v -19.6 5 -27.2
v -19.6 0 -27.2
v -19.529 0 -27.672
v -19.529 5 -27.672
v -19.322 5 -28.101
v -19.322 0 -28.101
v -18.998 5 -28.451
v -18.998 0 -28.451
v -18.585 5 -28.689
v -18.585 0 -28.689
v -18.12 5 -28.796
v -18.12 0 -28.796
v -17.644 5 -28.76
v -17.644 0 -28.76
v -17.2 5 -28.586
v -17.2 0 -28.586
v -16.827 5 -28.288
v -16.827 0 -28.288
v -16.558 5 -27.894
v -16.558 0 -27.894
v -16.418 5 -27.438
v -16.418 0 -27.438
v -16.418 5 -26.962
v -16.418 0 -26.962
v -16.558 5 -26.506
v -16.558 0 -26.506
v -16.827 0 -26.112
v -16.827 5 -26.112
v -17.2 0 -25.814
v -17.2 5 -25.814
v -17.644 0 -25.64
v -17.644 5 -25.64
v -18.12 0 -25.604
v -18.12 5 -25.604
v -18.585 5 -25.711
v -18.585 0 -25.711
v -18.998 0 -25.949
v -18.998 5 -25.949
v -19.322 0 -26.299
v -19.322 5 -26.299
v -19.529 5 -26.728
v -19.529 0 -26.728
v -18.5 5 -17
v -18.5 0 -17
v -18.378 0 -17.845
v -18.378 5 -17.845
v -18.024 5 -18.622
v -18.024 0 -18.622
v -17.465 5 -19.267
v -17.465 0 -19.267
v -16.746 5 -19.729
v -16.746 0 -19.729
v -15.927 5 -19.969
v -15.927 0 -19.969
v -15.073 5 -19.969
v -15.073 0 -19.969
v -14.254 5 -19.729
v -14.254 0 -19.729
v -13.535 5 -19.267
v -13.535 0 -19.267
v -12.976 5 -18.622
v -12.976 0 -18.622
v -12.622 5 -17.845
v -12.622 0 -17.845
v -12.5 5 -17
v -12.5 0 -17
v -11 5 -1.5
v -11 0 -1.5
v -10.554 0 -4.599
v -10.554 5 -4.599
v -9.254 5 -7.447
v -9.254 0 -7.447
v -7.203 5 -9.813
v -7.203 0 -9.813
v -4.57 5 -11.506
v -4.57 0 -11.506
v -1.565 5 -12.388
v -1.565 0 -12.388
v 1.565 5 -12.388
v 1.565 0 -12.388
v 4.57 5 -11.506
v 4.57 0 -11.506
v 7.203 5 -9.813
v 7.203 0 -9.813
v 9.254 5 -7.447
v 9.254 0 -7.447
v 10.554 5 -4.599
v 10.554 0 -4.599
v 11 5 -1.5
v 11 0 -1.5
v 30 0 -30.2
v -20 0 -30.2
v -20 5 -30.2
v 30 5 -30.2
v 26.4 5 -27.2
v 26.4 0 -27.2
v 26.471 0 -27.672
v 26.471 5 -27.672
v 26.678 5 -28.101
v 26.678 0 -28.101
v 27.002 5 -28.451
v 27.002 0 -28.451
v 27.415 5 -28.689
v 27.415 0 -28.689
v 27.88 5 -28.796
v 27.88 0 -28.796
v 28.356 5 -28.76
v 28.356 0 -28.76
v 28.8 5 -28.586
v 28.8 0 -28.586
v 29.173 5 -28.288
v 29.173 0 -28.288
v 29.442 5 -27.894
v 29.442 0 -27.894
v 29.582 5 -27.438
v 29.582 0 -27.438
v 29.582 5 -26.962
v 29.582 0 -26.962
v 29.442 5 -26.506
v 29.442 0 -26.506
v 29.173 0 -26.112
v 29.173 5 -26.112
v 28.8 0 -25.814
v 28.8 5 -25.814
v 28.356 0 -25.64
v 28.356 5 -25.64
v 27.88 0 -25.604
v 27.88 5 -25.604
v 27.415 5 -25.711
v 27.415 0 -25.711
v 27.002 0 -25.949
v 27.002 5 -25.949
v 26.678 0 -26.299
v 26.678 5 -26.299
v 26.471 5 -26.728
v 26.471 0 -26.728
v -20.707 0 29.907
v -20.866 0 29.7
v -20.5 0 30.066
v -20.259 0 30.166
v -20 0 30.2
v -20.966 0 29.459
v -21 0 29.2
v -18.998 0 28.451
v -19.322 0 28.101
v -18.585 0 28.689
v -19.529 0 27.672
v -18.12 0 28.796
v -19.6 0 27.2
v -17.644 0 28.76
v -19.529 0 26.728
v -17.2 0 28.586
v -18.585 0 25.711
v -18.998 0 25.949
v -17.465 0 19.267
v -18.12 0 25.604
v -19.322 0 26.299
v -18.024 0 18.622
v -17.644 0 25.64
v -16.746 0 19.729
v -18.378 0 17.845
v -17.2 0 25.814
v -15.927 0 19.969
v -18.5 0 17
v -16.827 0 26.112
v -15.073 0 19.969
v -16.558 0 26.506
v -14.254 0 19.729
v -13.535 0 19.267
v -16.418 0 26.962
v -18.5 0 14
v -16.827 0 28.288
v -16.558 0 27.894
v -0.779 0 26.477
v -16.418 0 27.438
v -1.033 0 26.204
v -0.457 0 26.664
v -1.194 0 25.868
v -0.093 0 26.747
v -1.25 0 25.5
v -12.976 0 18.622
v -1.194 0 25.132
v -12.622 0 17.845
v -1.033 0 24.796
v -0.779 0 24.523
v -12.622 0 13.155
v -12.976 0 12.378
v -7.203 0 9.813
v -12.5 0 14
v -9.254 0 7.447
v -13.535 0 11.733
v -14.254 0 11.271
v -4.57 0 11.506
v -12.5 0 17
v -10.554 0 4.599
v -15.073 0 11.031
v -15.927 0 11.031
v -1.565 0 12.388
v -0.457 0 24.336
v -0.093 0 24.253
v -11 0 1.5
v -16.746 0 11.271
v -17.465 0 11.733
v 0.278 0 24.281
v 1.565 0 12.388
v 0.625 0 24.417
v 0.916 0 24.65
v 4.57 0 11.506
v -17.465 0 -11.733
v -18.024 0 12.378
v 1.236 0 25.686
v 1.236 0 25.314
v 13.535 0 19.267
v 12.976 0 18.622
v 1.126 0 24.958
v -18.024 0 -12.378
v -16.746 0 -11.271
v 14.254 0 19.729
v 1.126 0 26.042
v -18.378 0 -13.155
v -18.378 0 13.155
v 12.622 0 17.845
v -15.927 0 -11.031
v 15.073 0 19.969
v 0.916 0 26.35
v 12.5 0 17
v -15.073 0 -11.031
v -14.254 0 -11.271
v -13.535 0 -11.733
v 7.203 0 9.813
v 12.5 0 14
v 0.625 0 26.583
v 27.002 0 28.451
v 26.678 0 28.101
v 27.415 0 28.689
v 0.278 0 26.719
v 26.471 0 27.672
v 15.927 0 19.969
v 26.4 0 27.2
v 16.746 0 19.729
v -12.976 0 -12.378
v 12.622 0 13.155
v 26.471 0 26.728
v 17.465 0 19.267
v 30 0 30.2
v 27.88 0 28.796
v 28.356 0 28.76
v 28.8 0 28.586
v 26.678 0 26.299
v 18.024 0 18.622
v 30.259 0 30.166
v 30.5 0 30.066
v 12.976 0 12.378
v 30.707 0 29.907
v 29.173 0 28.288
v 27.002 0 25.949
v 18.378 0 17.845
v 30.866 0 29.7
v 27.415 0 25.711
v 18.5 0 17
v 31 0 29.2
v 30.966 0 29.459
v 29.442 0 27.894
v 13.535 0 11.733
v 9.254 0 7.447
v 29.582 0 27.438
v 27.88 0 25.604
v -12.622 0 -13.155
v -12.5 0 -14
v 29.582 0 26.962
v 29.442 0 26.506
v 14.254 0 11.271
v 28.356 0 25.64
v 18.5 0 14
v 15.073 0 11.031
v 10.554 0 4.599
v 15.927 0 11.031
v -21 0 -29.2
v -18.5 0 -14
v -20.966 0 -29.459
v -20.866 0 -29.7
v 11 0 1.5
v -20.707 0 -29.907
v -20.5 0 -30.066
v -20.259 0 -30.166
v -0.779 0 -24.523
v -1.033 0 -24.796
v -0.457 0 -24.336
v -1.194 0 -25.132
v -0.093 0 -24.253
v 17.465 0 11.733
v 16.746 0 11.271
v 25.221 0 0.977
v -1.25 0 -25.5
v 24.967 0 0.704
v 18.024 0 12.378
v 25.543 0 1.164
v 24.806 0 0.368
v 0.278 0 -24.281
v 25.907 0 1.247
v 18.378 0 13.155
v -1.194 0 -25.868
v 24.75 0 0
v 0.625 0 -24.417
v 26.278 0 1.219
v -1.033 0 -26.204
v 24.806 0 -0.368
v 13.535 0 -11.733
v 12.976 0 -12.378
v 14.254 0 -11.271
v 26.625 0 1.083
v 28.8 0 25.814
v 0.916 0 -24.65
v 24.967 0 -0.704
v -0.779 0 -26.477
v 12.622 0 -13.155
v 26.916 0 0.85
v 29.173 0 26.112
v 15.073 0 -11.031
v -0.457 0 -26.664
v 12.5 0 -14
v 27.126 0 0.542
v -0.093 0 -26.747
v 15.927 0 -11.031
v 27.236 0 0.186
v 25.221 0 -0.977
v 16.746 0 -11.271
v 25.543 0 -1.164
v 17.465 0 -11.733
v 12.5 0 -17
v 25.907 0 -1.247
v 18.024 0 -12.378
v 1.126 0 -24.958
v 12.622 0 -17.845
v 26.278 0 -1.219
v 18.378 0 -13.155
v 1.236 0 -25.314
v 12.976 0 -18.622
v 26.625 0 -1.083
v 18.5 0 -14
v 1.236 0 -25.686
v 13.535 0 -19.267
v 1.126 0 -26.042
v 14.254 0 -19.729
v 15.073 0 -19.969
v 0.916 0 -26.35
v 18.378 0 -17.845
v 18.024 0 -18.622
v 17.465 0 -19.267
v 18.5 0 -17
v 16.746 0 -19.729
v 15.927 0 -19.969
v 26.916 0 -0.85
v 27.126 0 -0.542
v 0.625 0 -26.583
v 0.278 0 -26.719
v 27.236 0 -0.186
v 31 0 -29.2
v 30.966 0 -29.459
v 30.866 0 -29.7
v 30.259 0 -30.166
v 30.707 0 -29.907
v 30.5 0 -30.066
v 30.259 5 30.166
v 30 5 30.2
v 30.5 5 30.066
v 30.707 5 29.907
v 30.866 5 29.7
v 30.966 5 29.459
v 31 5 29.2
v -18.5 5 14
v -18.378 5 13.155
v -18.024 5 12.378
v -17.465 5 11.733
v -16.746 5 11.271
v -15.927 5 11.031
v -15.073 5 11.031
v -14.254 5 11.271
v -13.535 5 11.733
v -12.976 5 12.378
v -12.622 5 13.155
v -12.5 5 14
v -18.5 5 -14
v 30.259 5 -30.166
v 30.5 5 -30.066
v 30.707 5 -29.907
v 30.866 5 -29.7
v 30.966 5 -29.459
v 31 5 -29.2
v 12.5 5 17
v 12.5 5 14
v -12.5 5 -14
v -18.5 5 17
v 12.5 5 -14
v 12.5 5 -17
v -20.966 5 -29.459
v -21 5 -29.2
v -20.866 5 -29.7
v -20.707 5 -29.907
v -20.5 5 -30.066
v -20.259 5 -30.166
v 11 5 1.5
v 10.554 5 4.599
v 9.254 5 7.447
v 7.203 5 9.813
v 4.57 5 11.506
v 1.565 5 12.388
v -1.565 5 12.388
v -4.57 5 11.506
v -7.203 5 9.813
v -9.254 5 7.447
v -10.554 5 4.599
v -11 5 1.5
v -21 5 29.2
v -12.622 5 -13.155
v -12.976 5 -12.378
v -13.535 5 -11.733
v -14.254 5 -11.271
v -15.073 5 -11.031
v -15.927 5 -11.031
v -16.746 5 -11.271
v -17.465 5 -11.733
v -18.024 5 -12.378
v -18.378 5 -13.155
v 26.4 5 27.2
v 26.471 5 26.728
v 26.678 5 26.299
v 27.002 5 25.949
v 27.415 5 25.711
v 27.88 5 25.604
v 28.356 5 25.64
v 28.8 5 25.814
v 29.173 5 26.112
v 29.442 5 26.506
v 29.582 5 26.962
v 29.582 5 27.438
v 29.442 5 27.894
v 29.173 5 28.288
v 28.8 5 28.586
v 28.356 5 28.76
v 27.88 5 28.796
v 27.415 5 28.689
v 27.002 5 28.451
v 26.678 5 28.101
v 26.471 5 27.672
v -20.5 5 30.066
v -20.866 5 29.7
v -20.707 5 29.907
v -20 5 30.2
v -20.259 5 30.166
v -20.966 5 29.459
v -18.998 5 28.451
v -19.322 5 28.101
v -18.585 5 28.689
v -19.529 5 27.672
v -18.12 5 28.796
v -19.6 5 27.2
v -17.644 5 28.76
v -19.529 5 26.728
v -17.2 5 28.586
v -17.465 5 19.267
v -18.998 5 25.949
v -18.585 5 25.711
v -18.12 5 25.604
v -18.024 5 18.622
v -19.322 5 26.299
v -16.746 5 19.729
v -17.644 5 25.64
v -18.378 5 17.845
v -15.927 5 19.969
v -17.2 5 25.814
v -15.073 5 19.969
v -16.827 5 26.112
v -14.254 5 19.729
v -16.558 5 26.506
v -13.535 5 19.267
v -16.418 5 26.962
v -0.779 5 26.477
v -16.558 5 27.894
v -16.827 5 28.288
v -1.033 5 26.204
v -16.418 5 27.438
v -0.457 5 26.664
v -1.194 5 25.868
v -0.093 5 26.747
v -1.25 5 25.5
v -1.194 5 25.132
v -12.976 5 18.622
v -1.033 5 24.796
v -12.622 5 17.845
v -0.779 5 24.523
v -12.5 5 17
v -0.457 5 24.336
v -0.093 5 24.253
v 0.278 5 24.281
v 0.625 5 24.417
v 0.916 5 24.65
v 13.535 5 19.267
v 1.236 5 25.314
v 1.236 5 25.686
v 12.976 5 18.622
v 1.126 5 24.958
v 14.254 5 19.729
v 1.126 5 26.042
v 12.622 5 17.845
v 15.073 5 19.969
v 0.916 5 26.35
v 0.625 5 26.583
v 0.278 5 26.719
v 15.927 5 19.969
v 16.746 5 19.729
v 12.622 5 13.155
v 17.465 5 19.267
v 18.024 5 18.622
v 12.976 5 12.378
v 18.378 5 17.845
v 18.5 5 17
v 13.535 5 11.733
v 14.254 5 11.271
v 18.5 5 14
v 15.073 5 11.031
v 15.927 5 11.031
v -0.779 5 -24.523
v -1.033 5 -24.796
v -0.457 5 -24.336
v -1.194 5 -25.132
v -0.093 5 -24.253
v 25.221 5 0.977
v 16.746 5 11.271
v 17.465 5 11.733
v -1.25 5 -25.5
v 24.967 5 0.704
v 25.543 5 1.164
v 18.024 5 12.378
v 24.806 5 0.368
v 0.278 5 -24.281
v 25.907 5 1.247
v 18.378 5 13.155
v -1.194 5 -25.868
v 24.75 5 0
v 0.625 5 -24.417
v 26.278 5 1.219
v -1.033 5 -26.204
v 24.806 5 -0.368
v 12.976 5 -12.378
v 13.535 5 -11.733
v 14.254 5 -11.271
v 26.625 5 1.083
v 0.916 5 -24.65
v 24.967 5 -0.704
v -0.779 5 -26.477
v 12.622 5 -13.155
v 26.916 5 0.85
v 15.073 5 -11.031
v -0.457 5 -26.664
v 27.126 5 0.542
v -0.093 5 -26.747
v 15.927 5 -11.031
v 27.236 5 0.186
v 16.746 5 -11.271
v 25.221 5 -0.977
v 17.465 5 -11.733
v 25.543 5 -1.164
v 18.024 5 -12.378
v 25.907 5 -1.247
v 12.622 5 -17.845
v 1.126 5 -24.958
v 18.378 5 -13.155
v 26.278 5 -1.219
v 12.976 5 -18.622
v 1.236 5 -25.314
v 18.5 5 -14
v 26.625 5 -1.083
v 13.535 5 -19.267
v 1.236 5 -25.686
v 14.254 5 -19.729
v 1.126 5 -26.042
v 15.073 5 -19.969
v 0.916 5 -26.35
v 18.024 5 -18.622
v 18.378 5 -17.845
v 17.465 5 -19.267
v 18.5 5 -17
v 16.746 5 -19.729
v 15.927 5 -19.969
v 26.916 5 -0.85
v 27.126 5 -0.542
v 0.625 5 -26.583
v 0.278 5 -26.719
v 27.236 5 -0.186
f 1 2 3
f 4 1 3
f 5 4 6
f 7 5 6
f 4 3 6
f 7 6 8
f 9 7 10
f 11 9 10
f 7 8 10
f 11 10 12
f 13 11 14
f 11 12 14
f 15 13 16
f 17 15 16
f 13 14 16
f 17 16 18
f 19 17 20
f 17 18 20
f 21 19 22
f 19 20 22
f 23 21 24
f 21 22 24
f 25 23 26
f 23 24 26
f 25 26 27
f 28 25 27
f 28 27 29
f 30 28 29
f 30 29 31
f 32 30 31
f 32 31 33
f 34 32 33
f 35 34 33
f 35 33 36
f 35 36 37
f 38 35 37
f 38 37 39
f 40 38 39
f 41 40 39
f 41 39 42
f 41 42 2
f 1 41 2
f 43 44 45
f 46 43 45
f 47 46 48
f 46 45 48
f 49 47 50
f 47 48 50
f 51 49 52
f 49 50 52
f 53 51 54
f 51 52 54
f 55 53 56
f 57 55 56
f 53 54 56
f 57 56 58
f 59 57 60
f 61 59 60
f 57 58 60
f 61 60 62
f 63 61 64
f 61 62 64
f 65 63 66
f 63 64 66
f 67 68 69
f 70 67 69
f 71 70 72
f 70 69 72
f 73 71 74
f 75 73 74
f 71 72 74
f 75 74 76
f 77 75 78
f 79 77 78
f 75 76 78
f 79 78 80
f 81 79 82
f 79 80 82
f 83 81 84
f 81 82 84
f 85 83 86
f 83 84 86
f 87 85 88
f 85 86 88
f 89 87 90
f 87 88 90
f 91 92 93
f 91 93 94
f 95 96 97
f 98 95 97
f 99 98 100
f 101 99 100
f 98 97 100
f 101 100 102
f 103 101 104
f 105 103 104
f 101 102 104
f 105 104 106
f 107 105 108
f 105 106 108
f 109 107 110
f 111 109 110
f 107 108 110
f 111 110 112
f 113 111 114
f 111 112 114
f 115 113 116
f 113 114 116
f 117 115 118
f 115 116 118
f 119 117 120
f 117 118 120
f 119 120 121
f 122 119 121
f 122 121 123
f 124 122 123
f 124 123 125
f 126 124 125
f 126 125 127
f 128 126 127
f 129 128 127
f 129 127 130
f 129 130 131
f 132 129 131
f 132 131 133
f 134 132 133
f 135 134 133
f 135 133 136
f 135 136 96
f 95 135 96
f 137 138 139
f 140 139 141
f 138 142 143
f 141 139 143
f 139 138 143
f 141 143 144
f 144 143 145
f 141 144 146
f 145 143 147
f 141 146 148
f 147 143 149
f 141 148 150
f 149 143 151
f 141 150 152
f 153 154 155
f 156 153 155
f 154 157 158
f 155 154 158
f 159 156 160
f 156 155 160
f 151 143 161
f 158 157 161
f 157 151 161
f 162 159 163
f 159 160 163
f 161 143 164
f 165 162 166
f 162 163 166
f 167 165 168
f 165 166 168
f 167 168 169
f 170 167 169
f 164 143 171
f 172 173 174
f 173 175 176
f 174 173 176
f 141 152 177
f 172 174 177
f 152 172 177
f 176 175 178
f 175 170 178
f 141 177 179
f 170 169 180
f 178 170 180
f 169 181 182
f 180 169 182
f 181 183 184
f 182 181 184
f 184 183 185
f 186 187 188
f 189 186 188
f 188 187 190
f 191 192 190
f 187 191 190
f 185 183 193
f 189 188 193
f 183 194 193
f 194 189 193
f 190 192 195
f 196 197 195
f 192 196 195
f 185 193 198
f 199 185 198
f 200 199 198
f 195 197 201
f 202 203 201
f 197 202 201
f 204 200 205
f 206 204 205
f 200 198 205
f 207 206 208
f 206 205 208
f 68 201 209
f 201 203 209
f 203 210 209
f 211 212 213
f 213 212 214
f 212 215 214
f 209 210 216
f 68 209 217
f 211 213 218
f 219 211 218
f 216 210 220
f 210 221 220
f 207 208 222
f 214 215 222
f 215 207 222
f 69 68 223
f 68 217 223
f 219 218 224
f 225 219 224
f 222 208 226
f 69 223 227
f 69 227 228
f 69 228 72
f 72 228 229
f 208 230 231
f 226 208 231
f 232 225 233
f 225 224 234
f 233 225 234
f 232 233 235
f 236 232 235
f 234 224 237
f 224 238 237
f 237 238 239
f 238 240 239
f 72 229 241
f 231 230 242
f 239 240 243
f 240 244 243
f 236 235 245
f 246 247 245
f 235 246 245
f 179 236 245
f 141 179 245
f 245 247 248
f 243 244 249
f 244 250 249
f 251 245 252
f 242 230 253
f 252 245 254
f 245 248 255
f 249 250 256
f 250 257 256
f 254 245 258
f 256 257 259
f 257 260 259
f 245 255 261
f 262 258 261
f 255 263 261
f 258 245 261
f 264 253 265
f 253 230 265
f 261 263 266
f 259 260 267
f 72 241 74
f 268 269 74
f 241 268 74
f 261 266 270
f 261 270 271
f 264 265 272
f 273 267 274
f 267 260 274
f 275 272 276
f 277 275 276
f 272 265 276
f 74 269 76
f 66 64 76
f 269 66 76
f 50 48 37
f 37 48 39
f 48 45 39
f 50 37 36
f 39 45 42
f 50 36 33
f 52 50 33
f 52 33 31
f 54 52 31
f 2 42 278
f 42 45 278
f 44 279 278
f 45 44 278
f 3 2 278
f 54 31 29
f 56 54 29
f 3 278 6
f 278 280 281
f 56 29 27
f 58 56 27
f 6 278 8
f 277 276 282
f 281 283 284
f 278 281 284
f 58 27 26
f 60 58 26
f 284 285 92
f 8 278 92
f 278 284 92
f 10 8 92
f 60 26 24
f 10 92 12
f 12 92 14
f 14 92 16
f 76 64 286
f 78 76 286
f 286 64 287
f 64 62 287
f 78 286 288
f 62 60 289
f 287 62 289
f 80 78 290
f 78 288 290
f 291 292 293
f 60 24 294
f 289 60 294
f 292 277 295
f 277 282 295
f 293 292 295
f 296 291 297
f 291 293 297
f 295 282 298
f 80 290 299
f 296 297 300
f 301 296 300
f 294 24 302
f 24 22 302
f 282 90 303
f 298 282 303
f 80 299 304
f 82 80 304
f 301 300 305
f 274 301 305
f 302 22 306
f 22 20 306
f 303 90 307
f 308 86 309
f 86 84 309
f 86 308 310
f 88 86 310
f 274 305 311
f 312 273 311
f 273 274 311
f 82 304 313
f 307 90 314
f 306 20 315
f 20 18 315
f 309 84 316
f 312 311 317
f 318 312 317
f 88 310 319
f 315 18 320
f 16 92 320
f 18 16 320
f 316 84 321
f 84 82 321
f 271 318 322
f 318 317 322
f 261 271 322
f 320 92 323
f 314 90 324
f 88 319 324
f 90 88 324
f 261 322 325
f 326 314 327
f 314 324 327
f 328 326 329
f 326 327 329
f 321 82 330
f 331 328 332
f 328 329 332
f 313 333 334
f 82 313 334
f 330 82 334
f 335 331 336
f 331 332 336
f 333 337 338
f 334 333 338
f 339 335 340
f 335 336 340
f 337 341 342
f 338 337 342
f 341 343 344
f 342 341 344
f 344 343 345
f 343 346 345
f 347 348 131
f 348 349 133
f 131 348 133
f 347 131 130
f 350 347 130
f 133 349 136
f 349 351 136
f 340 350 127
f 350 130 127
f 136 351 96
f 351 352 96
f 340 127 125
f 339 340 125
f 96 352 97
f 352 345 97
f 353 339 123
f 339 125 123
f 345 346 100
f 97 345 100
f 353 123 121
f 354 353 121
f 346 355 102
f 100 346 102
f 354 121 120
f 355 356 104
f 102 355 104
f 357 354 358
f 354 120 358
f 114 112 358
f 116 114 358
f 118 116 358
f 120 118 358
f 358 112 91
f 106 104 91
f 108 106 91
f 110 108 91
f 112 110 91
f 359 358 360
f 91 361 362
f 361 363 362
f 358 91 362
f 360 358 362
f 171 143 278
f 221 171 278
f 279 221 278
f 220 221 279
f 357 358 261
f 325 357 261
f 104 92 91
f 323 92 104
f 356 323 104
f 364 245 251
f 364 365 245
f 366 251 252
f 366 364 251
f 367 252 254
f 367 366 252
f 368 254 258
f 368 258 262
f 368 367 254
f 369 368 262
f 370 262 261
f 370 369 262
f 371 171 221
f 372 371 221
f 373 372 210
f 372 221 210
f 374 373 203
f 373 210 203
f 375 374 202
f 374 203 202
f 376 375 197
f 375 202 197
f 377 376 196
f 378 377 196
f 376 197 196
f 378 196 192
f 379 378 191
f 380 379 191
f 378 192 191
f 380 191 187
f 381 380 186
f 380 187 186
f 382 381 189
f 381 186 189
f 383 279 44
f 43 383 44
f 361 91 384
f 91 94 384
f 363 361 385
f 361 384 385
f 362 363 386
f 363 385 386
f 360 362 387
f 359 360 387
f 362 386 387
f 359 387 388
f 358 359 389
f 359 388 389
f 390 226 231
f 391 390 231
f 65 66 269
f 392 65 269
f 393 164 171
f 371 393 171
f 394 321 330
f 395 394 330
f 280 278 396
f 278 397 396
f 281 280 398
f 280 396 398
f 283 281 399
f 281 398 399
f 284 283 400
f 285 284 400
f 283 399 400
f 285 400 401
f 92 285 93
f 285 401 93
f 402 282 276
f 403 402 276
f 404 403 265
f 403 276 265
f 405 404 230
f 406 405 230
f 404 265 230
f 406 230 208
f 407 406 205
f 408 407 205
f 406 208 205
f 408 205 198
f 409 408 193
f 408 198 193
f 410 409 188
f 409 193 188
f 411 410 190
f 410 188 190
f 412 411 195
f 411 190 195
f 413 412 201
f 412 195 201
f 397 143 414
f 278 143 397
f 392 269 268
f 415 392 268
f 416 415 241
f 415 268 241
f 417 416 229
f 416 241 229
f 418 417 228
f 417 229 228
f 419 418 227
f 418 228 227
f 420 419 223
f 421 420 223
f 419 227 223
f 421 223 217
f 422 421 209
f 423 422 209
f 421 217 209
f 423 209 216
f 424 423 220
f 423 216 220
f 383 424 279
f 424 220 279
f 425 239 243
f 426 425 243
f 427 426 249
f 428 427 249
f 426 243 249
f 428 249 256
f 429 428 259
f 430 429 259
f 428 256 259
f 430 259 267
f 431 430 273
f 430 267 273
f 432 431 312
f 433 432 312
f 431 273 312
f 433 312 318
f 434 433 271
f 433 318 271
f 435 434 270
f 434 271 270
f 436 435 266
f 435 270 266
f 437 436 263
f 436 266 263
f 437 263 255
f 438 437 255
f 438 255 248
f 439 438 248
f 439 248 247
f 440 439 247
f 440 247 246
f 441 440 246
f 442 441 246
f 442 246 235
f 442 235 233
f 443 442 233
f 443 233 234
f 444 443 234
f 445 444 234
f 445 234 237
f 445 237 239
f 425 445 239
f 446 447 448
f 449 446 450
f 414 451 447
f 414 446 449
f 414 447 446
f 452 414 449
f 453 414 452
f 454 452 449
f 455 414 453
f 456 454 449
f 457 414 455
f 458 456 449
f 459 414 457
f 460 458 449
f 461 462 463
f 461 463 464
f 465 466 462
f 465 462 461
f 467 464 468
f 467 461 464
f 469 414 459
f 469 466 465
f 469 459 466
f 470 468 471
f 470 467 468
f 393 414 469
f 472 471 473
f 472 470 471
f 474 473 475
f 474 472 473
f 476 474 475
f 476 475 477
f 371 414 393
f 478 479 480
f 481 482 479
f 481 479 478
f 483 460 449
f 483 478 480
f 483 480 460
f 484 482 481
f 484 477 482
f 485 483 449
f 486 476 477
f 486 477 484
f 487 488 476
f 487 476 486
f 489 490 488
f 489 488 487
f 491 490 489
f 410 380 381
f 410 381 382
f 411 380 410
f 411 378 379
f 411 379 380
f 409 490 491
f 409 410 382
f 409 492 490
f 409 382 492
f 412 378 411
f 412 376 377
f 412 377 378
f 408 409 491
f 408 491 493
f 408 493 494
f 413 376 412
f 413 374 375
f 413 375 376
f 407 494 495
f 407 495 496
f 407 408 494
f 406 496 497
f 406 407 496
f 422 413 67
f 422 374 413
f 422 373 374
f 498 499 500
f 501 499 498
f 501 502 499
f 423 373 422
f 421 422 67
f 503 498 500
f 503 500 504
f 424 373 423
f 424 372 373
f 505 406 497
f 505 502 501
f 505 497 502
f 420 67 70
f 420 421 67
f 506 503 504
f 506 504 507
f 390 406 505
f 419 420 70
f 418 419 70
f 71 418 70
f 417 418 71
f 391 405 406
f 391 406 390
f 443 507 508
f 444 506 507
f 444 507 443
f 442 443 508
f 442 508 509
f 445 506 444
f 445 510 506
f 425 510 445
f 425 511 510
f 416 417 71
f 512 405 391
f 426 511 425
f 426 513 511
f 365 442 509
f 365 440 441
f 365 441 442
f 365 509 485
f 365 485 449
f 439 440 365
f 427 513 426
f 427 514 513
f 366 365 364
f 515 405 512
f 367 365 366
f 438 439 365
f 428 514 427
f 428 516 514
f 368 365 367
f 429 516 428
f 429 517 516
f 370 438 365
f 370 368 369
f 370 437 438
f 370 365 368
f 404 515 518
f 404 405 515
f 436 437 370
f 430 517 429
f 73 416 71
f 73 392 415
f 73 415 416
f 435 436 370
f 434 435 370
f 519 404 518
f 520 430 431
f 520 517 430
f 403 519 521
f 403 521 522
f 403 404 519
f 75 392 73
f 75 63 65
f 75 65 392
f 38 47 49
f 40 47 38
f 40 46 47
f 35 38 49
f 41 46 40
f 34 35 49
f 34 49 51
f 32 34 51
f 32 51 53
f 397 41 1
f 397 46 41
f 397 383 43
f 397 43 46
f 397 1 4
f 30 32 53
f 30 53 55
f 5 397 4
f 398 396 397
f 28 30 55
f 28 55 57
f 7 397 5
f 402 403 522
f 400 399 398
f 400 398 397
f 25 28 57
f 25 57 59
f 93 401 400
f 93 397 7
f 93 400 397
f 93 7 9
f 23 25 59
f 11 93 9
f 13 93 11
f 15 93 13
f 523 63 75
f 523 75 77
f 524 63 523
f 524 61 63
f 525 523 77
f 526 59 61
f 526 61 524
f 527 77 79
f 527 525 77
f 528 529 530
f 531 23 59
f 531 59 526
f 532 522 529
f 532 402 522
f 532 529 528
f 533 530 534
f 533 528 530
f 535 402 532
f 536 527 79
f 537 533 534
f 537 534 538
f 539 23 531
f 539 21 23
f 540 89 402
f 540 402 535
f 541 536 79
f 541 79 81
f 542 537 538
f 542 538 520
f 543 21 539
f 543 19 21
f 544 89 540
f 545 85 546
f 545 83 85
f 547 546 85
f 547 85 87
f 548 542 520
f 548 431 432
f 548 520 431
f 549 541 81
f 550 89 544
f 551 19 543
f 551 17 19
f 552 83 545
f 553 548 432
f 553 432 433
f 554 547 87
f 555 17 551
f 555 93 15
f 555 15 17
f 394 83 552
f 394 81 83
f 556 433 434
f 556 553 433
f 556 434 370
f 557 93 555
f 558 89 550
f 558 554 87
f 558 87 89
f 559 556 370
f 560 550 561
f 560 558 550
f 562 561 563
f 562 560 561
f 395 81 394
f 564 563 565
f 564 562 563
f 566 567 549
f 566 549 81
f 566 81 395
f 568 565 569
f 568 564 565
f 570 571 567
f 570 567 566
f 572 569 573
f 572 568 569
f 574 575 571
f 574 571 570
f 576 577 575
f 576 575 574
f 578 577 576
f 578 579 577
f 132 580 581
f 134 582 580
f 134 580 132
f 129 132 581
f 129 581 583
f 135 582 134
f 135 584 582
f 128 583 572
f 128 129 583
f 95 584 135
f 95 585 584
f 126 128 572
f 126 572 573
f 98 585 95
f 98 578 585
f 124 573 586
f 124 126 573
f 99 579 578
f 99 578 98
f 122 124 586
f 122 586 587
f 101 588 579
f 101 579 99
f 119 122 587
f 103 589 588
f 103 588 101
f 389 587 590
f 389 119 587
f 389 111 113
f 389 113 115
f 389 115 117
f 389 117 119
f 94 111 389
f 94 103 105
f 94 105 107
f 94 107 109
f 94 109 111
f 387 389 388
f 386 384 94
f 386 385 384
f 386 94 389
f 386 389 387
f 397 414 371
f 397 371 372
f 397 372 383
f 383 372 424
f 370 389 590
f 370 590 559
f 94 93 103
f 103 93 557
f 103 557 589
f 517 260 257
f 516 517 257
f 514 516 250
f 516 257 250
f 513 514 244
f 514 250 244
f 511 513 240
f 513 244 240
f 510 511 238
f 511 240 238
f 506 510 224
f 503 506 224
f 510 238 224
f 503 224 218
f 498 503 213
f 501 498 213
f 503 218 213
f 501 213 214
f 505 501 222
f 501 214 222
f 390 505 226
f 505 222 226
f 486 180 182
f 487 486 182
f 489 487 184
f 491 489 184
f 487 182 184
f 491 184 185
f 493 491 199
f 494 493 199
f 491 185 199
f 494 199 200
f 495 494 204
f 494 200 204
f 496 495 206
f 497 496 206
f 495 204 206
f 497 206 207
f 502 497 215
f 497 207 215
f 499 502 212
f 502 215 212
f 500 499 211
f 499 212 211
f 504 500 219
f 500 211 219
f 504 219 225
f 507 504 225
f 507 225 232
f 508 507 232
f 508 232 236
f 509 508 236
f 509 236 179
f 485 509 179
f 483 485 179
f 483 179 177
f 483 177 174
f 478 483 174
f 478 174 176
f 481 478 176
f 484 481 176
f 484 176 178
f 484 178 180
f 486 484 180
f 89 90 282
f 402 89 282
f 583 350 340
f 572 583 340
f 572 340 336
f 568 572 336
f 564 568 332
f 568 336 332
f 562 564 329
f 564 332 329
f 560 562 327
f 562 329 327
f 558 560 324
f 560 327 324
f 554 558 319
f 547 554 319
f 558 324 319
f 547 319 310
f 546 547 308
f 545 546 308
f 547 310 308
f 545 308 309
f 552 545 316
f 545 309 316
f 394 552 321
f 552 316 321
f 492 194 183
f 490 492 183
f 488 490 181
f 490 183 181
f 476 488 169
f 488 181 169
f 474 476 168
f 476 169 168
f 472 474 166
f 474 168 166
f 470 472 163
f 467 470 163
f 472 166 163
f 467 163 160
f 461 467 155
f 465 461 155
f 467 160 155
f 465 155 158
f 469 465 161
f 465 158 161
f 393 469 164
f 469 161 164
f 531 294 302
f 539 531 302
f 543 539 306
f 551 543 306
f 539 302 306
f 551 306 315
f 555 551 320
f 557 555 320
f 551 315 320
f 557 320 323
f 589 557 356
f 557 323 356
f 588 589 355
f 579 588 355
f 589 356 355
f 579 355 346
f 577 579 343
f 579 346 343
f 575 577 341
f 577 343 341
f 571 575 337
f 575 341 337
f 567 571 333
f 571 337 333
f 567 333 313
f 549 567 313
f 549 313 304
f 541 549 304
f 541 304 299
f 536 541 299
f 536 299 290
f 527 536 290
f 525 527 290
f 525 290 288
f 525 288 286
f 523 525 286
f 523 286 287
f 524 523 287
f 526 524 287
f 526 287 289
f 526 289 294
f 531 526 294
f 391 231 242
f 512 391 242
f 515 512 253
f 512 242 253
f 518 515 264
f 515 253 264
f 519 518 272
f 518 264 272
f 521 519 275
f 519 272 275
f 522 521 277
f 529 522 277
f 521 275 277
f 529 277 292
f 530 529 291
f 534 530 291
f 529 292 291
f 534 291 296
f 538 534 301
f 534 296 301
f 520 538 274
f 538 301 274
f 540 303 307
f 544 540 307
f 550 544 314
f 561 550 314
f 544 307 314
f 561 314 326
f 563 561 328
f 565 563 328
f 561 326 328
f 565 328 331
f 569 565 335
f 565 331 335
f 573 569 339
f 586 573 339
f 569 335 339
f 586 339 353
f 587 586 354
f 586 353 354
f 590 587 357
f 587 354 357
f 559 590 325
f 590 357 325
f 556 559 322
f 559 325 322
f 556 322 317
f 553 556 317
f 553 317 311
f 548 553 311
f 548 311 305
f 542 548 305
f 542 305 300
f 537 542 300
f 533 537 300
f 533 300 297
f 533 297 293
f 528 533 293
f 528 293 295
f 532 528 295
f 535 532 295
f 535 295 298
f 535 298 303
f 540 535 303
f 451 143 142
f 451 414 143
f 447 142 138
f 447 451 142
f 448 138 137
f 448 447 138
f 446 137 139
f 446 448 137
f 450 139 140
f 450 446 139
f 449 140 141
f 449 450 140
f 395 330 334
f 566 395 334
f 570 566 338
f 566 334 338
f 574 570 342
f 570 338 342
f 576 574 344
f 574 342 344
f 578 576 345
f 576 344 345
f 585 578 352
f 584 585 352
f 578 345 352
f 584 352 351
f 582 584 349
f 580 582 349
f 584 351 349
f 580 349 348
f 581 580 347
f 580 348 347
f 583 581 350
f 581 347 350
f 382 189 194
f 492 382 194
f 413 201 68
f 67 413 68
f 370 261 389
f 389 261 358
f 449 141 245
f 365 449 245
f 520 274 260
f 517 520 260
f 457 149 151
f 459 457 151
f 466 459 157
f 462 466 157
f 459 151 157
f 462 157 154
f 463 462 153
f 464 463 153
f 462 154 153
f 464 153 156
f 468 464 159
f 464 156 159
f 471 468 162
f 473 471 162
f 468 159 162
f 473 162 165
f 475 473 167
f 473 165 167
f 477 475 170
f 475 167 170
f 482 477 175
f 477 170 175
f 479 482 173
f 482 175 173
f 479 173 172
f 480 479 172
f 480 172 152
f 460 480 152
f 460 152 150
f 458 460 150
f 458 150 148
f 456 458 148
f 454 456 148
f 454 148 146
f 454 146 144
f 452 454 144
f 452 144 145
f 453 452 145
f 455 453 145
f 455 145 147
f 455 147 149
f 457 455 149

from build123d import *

# Parameters (mm, degrees)
SKETCH1_W                   = 52
SKETCH1_H                   = 60.4
BOSS_EXTRUDE1_DEPTH         = 5
M3_CLEARANCE_HOLE1_D        = 3.2
TAP_DRILL_FOR_M3X0_5_TAP1_D = 2.5
FILLET1_R                   = 1


with BuildPart() as part:
    # Sketch1 → Boss-Extrude1 (new body)
    with BuildSketch(Plane(origin=(0, 0, 0), x_dir=(1, 0, 0), z_dir=(0, 1, 0))):
        with Locations((5, 0)):
            Rectangle(SKETCH1_W, SKETCH1_H)
        with BuildLine():
            Line((-11, -1.5), (-11, 1.5))
            ThreePointArc((-11, 1.5), (0, 12.5), (11, 1.5))
            Line((11, 1.5), (11, -1.5))
            ThreePointArc((11, -1.5), (0, -12.5), (-11, -1.5))
        make_face(mode=Mode.SUBTRACT)
        with BuildLine():
            Line((-18.5, 14), (-18.5, 17))
            ThreePointArc((-18.5, 17), (-15.5, 20), (-12.5, 17))
            Line((-12.5, 17), (-12.5, 14))
            ThreePointArc((-12.5, 14), (-15.5, 11), (-18.5, 14))
        make_face(mode=Mode.SUBTRACT)
        with BuildLine():
            Line((12.5, 14), (12.5, 17))
            ThreePointArc((12.5, 17), (15.5, 20), (18.5, 17))
            Line((18.5, 17), (18.5, 14))
            ThreePointArc((18.5, 14), (15.5, 11), (12.5, 14))
        make_face(mode=Mode.SUBTRACT)
        with BuildLine():
            Line((12.5, -17), (12.5, -14))
            ThreePointArc((12.5, -14), (15.5, -11), (18.5, -14))
            Line((18.5, -14), (18.5, -17))
            ThreePointArc((18.5, -17), (15.5, -20), (12.5, -17))
        make_face(mode=Mode.SUBTRACT)
        with BuildLine():
            Line((-18.5, -17), (-18.5, -14))
            ThreePointArc((-18.5, -14), (-15.5, -11), (-12.5, -14))
            Line((-12.5, -14), (-12.5, -17))
            ThreePointArc((-12.5, -17), (-15.5, -20), (-18.5, -17))
        make_face(mode=Mode.SUBTRACT)
    extrude(amount=BOSS_EXTRUDE1_DEPTH)

    # M3 Clearance Hole1 (through all)
    with Locations(Plane(origin=(0, 5, 0), x_dir=(1, 0, 0), z_dir=(0, 1, 0))):
        with Locations((-18, -27.2), (28, -27.2), (28, 27.2), (-18, 27.2)):
            Hole(M3_CLEARANCE_HOLE1_D / 2)

    # Tap Drill for M3x0.5 Tap1 (through all)
    with Locations(Plane(origin=(0, 5, 0), x_dir=(1, 0, 0), z_dir=(0, 1, 0))):
        with Locations((26, 0), (0, 25.5), (0, -25.5)):
            Hole(TAP_DRILL_FOR_M3X0_5_TAP1_D / 2)

    # Fillet1
    fillet1_edges = [part.edges().sort_by_distance(p)[0] for p in [
        (-21, 2.5, -30.2),
        (31, 2.5, -30.2),
        (31, 2.5, 30.2),
        (-21, 2.5, 30.2),
    ]]
    fillet(fillet1_edges, radius=FILLET1_R)


solid = part.part
